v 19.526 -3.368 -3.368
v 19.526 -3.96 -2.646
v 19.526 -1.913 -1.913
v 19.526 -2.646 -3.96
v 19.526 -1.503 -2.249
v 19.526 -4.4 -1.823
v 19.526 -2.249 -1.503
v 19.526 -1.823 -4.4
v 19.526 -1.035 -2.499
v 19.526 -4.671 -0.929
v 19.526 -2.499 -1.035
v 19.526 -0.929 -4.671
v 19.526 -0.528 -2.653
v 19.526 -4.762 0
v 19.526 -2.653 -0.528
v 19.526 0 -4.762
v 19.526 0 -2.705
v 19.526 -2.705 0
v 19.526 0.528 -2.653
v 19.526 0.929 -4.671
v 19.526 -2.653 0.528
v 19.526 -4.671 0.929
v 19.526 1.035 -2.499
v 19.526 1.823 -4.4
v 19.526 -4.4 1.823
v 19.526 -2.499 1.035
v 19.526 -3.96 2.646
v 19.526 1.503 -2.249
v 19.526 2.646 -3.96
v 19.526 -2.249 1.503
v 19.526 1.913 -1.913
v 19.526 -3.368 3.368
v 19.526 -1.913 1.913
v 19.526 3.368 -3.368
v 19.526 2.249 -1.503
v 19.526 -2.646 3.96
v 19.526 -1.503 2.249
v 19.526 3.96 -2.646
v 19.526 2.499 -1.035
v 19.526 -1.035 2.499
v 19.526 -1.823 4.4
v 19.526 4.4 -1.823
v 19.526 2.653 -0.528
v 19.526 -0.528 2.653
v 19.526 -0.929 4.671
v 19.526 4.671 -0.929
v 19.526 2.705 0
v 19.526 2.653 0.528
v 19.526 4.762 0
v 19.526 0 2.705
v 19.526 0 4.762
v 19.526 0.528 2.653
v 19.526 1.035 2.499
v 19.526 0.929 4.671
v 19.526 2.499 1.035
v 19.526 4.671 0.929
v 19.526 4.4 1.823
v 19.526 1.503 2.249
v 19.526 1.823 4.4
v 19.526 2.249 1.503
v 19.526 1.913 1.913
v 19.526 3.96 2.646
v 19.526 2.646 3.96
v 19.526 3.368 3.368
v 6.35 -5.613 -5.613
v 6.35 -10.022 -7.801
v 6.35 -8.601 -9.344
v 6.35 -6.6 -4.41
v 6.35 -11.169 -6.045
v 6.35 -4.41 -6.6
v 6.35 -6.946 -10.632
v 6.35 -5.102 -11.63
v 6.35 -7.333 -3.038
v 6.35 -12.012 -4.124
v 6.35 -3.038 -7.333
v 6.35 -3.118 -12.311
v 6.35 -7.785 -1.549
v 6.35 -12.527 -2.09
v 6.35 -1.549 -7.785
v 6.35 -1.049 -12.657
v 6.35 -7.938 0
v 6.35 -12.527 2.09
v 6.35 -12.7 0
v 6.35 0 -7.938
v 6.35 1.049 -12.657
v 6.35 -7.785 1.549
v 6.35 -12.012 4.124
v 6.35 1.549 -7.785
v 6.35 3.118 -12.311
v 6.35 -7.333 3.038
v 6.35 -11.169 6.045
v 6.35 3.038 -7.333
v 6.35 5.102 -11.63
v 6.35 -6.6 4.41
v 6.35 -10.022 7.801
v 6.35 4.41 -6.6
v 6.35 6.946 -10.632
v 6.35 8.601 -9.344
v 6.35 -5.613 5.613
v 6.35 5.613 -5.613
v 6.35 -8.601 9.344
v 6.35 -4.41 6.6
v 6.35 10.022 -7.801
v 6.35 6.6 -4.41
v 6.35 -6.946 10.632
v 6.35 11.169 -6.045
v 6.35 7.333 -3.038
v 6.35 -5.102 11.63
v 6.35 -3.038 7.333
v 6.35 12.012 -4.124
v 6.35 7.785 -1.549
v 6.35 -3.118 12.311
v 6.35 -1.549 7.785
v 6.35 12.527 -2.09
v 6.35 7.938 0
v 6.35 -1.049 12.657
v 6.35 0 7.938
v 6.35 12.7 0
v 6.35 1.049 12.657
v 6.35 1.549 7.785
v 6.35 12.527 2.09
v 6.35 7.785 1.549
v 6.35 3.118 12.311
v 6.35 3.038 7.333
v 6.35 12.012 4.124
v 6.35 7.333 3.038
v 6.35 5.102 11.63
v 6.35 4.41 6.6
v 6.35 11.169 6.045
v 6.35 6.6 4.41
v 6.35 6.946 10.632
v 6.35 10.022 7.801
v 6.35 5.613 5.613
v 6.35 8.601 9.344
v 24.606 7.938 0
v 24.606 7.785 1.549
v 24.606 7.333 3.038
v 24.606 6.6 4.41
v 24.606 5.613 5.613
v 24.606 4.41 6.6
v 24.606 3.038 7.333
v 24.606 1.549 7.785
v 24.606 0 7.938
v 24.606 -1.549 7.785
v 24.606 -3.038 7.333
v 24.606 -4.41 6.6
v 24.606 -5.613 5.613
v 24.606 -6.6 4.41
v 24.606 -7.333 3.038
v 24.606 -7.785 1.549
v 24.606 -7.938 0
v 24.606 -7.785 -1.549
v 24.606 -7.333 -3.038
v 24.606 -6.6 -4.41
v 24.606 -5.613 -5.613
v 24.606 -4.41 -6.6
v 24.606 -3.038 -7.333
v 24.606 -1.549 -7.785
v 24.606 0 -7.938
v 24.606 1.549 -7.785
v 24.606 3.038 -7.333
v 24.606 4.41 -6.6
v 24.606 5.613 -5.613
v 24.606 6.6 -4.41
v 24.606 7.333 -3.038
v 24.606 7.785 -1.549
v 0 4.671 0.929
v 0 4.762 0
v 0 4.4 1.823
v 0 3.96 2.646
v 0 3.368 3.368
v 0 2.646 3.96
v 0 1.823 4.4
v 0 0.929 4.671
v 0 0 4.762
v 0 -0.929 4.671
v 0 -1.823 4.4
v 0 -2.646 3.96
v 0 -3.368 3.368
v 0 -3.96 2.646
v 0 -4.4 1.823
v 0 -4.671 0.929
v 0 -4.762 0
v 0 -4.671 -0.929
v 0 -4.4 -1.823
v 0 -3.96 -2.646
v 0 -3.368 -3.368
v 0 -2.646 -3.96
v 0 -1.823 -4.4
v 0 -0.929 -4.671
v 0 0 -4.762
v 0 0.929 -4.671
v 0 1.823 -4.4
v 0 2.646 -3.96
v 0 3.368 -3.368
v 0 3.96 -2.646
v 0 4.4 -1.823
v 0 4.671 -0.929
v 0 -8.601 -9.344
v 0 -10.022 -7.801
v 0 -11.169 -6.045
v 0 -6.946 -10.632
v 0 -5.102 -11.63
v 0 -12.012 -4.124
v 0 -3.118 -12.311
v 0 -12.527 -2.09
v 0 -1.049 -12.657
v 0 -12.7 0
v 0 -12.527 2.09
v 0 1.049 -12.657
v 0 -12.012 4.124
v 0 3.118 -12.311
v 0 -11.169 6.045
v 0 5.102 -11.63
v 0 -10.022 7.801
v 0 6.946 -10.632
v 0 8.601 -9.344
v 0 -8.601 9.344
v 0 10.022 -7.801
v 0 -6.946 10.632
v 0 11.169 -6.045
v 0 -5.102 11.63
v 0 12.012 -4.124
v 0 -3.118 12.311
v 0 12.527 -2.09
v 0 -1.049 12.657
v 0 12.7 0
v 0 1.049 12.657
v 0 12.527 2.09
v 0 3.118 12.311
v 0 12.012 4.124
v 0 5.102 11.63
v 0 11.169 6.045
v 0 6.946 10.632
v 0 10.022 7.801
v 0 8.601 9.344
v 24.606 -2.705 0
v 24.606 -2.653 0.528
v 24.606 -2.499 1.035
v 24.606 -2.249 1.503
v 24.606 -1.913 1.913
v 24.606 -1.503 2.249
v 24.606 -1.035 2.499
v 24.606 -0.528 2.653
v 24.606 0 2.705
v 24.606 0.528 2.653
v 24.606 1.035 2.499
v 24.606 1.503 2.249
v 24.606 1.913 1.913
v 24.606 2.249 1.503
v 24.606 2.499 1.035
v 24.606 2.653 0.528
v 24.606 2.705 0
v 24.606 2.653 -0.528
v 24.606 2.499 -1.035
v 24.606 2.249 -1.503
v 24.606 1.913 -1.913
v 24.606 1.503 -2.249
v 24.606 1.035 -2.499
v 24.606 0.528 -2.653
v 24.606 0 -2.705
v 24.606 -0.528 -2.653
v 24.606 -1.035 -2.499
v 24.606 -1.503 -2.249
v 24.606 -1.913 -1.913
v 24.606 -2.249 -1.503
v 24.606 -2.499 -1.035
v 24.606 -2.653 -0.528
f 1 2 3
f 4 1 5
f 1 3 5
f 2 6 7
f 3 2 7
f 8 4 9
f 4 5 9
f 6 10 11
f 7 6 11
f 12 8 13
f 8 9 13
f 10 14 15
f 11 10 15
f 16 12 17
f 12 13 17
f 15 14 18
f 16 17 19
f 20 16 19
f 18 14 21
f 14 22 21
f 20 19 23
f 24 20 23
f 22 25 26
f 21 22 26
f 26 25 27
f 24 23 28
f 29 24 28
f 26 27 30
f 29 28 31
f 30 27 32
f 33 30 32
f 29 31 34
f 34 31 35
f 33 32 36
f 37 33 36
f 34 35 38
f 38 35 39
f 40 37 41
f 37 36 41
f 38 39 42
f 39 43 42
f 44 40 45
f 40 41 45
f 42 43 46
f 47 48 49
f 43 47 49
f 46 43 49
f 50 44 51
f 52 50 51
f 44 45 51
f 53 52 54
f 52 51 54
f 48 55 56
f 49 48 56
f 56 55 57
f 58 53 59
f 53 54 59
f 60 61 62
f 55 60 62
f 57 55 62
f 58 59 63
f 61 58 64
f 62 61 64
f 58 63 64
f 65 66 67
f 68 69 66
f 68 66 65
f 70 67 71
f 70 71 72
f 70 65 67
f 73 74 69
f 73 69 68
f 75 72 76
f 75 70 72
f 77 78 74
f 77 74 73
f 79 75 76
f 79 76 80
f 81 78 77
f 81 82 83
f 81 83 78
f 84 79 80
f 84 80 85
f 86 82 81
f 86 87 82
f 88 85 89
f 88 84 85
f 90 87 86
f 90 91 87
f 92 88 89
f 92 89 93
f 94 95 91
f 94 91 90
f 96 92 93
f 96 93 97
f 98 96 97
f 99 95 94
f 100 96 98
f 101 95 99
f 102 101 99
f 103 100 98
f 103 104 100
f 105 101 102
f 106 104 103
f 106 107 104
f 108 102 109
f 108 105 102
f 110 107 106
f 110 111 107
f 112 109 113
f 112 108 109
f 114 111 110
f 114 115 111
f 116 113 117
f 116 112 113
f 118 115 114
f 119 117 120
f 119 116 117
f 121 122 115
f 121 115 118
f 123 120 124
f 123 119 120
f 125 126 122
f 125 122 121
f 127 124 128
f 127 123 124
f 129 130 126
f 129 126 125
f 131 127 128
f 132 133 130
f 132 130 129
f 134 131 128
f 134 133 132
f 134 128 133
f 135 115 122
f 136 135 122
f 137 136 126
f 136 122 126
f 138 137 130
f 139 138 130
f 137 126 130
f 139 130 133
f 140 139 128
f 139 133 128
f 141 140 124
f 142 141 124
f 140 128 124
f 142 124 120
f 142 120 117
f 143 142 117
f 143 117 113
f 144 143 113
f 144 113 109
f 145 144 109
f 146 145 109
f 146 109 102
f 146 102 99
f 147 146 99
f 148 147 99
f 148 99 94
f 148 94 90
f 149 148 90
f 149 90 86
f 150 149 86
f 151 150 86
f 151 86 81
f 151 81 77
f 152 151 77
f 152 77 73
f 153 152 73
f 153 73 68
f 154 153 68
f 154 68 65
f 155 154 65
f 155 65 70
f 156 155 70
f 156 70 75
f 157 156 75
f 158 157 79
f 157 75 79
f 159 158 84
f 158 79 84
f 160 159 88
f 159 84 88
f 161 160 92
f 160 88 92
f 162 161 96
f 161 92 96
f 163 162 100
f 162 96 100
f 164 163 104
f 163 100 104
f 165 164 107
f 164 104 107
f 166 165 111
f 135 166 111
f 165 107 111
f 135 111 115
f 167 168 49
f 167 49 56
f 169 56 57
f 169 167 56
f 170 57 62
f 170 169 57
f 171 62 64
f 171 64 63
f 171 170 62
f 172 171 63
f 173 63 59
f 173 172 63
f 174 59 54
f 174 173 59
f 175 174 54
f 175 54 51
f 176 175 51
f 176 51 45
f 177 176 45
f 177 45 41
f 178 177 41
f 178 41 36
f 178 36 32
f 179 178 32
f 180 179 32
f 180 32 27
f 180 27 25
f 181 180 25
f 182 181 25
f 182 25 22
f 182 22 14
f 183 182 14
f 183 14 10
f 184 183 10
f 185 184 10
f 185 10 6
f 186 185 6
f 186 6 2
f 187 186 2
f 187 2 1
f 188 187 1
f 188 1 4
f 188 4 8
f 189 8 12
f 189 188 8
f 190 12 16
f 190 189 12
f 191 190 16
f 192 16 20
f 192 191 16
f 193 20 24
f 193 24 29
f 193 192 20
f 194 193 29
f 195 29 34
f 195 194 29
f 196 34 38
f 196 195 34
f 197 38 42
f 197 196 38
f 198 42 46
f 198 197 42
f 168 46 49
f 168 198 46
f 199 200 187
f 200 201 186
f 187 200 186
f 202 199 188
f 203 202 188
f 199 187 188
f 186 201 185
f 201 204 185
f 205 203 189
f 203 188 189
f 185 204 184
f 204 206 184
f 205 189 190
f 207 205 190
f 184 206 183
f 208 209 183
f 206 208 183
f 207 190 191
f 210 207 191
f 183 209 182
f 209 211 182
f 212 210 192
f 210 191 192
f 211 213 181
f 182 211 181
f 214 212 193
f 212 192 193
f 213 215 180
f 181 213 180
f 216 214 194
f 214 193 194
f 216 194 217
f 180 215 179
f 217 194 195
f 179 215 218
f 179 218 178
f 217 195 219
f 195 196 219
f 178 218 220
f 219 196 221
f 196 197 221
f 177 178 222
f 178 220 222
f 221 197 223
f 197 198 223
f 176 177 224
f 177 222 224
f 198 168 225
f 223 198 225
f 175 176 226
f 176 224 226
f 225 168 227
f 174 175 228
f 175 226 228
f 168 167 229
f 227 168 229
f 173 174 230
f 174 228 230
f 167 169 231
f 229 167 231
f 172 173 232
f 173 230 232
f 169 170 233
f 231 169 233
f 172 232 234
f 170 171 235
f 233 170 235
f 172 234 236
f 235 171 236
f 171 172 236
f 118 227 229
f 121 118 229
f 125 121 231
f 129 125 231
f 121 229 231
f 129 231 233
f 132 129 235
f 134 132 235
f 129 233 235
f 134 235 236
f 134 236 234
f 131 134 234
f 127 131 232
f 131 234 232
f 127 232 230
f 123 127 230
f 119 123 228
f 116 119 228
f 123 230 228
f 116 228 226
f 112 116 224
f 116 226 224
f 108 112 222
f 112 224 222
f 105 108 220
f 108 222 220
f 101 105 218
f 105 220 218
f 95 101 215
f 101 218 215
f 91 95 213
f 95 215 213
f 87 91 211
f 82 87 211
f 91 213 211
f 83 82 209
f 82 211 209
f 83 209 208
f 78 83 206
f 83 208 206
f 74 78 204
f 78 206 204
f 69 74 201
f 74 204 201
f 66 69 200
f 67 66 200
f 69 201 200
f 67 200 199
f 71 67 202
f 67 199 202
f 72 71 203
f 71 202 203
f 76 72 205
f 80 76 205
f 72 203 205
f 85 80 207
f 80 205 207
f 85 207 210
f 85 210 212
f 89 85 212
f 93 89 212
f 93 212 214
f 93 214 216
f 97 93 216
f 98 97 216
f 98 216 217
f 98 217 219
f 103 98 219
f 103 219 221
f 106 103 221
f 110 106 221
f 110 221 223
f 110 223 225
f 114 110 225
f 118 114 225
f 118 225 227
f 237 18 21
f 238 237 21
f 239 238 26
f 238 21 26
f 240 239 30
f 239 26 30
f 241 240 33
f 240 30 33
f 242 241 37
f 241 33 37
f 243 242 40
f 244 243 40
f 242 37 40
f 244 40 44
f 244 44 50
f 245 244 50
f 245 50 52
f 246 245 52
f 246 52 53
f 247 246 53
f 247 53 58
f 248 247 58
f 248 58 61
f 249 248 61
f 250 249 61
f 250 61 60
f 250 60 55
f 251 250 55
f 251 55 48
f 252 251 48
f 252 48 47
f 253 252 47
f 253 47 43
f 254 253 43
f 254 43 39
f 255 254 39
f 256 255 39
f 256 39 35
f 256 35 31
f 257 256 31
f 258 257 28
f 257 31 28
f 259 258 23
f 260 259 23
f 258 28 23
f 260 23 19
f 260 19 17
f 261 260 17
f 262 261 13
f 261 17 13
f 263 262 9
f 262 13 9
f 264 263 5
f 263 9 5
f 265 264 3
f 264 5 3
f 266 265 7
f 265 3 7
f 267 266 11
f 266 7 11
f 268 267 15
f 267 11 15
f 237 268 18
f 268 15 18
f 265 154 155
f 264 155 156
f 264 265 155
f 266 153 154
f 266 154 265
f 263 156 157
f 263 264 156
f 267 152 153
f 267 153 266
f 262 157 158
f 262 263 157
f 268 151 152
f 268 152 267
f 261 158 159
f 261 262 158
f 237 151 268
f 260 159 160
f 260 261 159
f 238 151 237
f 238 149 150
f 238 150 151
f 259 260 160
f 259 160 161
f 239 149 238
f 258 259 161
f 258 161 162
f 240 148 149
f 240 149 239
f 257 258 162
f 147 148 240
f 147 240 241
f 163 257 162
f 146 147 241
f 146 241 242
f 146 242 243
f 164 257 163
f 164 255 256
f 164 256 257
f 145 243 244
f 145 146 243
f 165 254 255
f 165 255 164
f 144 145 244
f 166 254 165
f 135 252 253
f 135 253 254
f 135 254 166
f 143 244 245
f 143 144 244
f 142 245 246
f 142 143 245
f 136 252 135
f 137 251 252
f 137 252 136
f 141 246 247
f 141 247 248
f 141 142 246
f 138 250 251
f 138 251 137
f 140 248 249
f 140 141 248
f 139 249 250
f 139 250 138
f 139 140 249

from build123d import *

# Parameters (mm, degrees)
F0_R     = 12.7
F0_R_2   = 7.9375
F1_DEPTH = 6.35
F0_R_3   = 4.7625
F2_DEPTH = 24.60625
F3_R     = 4.7625
F3_R_2   = 3.175
F4_DEPTH = 5.08
F5_DEPTH = 5.08
F6_D     = 5.4102


with BuildPart() as f1:
    # F0 (on Right) → F1 (new body)
    with BuildSketch(Plane.YZ):
        Circle(F0_R)
        Circle(F0_R_2, mode=Mode.SUBTRACT)
    extrude(amount=F1_DEPTH)

    # F0 (on Right) → F2 (join)
    with BuildSketch(Plane.YZ):
        Circle(F0_R_2)
        Circle(F0_R_3, mode=Mode.SUBTRACT)
    extrude(amount=F2_DEPTH)

    # F3 (on face) → F4 (join)
    with BuildSketch(Plane.YZ.offset(24.60625)):
        Circle(F3_R)
        Circle(F3_R_2, mode=Mode.SUBTRACT)
    extrude(amount=-F4_DEPTH)

    # F3 (on face) → F5 (join)
    with BuildSketch(Plane.YZ.offset(24.60625)):
        Circle(F3_R_2)
    extrude(amount=-F5_DEPTH)

    # F6 (through all)
    with Locations(Plane.YZ.offset(24.60625)):
        with Locations((0, 0)):
            Hole(F6_D / 2)


solid = f1.part
